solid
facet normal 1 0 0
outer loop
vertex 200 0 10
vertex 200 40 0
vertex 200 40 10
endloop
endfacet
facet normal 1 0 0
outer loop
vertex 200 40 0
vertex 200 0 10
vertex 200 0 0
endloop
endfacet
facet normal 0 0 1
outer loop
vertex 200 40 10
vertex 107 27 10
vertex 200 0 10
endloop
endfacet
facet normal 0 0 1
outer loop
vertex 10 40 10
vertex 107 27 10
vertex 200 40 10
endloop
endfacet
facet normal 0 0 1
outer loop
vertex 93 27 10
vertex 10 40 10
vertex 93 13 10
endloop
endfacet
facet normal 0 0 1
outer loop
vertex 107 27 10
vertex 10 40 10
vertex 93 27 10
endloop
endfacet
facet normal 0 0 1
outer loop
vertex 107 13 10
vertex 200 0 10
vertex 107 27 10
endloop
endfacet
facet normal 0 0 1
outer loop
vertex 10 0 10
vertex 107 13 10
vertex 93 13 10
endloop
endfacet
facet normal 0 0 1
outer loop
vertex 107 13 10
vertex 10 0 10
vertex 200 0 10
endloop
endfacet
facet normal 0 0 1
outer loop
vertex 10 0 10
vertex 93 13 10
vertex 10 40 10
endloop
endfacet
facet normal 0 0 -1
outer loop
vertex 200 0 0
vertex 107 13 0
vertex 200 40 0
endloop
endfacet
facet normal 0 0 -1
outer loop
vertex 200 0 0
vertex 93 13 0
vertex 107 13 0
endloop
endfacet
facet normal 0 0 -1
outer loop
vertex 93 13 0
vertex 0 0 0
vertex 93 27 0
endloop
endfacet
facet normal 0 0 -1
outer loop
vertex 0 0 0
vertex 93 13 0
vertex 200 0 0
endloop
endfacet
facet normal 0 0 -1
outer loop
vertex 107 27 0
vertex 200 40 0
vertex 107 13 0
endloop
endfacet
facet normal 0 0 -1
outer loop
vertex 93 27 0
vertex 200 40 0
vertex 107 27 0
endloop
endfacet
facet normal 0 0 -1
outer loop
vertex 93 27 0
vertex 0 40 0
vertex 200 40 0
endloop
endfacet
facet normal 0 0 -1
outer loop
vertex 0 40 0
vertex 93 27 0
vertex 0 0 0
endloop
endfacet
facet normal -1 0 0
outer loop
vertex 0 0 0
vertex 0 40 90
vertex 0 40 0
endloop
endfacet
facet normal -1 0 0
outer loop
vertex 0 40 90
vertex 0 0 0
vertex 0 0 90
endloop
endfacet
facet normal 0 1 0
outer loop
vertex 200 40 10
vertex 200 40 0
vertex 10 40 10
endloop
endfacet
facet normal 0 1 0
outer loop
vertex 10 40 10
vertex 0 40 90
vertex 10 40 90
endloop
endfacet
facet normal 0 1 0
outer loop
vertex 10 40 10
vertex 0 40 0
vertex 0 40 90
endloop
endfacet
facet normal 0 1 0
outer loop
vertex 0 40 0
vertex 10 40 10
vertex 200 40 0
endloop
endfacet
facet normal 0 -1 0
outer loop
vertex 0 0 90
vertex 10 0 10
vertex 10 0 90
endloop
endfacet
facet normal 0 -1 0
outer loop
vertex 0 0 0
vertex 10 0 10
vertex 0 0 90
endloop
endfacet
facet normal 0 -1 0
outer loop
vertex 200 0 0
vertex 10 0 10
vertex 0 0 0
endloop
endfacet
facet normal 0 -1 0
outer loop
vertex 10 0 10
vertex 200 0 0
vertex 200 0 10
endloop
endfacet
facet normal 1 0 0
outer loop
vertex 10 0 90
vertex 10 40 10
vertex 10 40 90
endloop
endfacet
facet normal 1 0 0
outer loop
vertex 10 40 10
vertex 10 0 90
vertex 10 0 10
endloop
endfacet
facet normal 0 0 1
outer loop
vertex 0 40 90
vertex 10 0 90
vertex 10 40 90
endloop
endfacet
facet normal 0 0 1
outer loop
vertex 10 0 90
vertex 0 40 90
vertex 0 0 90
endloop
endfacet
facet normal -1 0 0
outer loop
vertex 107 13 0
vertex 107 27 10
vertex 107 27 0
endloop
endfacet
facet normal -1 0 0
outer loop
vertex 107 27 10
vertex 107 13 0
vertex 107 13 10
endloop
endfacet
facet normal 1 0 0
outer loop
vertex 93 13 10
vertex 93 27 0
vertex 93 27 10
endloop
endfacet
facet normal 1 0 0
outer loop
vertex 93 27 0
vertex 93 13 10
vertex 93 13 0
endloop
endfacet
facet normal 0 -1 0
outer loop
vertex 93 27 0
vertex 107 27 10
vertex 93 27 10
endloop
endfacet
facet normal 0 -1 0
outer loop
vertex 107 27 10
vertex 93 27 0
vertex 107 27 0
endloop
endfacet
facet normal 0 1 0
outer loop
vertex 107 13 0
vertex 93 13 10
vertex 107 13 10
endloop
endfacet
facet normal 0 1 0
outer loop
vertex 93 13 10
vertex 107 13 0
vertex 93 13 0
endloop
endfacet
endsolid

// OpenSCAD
$fn = 32;

// ----------------------------------------------------------------------
// Gantry bracket: 200-250 mm L bracket
// ----------------------------------------------------------------------

// --- parameters (mm) ---
base_l = 200;             // base arm length, X
arm_w = 40;               // arm width, Y
thick = 10;               // arm thickness
up_h = 80;                // vertical arm height, Z
slot_w = 14;              // adjustment slot width in the base

total_h = up_h + thick;  // overall height

difference() {
  union() {
    cube([base_l, arm_w, thick]);
    cube([thick, arm_w, total_h]);
  }
  translate([base_l / 2 - slot_w / 2, arm_w / 2 - slot_w / 2, -1])
    cube([slot_w, slot_w, thick + 2]);
}
